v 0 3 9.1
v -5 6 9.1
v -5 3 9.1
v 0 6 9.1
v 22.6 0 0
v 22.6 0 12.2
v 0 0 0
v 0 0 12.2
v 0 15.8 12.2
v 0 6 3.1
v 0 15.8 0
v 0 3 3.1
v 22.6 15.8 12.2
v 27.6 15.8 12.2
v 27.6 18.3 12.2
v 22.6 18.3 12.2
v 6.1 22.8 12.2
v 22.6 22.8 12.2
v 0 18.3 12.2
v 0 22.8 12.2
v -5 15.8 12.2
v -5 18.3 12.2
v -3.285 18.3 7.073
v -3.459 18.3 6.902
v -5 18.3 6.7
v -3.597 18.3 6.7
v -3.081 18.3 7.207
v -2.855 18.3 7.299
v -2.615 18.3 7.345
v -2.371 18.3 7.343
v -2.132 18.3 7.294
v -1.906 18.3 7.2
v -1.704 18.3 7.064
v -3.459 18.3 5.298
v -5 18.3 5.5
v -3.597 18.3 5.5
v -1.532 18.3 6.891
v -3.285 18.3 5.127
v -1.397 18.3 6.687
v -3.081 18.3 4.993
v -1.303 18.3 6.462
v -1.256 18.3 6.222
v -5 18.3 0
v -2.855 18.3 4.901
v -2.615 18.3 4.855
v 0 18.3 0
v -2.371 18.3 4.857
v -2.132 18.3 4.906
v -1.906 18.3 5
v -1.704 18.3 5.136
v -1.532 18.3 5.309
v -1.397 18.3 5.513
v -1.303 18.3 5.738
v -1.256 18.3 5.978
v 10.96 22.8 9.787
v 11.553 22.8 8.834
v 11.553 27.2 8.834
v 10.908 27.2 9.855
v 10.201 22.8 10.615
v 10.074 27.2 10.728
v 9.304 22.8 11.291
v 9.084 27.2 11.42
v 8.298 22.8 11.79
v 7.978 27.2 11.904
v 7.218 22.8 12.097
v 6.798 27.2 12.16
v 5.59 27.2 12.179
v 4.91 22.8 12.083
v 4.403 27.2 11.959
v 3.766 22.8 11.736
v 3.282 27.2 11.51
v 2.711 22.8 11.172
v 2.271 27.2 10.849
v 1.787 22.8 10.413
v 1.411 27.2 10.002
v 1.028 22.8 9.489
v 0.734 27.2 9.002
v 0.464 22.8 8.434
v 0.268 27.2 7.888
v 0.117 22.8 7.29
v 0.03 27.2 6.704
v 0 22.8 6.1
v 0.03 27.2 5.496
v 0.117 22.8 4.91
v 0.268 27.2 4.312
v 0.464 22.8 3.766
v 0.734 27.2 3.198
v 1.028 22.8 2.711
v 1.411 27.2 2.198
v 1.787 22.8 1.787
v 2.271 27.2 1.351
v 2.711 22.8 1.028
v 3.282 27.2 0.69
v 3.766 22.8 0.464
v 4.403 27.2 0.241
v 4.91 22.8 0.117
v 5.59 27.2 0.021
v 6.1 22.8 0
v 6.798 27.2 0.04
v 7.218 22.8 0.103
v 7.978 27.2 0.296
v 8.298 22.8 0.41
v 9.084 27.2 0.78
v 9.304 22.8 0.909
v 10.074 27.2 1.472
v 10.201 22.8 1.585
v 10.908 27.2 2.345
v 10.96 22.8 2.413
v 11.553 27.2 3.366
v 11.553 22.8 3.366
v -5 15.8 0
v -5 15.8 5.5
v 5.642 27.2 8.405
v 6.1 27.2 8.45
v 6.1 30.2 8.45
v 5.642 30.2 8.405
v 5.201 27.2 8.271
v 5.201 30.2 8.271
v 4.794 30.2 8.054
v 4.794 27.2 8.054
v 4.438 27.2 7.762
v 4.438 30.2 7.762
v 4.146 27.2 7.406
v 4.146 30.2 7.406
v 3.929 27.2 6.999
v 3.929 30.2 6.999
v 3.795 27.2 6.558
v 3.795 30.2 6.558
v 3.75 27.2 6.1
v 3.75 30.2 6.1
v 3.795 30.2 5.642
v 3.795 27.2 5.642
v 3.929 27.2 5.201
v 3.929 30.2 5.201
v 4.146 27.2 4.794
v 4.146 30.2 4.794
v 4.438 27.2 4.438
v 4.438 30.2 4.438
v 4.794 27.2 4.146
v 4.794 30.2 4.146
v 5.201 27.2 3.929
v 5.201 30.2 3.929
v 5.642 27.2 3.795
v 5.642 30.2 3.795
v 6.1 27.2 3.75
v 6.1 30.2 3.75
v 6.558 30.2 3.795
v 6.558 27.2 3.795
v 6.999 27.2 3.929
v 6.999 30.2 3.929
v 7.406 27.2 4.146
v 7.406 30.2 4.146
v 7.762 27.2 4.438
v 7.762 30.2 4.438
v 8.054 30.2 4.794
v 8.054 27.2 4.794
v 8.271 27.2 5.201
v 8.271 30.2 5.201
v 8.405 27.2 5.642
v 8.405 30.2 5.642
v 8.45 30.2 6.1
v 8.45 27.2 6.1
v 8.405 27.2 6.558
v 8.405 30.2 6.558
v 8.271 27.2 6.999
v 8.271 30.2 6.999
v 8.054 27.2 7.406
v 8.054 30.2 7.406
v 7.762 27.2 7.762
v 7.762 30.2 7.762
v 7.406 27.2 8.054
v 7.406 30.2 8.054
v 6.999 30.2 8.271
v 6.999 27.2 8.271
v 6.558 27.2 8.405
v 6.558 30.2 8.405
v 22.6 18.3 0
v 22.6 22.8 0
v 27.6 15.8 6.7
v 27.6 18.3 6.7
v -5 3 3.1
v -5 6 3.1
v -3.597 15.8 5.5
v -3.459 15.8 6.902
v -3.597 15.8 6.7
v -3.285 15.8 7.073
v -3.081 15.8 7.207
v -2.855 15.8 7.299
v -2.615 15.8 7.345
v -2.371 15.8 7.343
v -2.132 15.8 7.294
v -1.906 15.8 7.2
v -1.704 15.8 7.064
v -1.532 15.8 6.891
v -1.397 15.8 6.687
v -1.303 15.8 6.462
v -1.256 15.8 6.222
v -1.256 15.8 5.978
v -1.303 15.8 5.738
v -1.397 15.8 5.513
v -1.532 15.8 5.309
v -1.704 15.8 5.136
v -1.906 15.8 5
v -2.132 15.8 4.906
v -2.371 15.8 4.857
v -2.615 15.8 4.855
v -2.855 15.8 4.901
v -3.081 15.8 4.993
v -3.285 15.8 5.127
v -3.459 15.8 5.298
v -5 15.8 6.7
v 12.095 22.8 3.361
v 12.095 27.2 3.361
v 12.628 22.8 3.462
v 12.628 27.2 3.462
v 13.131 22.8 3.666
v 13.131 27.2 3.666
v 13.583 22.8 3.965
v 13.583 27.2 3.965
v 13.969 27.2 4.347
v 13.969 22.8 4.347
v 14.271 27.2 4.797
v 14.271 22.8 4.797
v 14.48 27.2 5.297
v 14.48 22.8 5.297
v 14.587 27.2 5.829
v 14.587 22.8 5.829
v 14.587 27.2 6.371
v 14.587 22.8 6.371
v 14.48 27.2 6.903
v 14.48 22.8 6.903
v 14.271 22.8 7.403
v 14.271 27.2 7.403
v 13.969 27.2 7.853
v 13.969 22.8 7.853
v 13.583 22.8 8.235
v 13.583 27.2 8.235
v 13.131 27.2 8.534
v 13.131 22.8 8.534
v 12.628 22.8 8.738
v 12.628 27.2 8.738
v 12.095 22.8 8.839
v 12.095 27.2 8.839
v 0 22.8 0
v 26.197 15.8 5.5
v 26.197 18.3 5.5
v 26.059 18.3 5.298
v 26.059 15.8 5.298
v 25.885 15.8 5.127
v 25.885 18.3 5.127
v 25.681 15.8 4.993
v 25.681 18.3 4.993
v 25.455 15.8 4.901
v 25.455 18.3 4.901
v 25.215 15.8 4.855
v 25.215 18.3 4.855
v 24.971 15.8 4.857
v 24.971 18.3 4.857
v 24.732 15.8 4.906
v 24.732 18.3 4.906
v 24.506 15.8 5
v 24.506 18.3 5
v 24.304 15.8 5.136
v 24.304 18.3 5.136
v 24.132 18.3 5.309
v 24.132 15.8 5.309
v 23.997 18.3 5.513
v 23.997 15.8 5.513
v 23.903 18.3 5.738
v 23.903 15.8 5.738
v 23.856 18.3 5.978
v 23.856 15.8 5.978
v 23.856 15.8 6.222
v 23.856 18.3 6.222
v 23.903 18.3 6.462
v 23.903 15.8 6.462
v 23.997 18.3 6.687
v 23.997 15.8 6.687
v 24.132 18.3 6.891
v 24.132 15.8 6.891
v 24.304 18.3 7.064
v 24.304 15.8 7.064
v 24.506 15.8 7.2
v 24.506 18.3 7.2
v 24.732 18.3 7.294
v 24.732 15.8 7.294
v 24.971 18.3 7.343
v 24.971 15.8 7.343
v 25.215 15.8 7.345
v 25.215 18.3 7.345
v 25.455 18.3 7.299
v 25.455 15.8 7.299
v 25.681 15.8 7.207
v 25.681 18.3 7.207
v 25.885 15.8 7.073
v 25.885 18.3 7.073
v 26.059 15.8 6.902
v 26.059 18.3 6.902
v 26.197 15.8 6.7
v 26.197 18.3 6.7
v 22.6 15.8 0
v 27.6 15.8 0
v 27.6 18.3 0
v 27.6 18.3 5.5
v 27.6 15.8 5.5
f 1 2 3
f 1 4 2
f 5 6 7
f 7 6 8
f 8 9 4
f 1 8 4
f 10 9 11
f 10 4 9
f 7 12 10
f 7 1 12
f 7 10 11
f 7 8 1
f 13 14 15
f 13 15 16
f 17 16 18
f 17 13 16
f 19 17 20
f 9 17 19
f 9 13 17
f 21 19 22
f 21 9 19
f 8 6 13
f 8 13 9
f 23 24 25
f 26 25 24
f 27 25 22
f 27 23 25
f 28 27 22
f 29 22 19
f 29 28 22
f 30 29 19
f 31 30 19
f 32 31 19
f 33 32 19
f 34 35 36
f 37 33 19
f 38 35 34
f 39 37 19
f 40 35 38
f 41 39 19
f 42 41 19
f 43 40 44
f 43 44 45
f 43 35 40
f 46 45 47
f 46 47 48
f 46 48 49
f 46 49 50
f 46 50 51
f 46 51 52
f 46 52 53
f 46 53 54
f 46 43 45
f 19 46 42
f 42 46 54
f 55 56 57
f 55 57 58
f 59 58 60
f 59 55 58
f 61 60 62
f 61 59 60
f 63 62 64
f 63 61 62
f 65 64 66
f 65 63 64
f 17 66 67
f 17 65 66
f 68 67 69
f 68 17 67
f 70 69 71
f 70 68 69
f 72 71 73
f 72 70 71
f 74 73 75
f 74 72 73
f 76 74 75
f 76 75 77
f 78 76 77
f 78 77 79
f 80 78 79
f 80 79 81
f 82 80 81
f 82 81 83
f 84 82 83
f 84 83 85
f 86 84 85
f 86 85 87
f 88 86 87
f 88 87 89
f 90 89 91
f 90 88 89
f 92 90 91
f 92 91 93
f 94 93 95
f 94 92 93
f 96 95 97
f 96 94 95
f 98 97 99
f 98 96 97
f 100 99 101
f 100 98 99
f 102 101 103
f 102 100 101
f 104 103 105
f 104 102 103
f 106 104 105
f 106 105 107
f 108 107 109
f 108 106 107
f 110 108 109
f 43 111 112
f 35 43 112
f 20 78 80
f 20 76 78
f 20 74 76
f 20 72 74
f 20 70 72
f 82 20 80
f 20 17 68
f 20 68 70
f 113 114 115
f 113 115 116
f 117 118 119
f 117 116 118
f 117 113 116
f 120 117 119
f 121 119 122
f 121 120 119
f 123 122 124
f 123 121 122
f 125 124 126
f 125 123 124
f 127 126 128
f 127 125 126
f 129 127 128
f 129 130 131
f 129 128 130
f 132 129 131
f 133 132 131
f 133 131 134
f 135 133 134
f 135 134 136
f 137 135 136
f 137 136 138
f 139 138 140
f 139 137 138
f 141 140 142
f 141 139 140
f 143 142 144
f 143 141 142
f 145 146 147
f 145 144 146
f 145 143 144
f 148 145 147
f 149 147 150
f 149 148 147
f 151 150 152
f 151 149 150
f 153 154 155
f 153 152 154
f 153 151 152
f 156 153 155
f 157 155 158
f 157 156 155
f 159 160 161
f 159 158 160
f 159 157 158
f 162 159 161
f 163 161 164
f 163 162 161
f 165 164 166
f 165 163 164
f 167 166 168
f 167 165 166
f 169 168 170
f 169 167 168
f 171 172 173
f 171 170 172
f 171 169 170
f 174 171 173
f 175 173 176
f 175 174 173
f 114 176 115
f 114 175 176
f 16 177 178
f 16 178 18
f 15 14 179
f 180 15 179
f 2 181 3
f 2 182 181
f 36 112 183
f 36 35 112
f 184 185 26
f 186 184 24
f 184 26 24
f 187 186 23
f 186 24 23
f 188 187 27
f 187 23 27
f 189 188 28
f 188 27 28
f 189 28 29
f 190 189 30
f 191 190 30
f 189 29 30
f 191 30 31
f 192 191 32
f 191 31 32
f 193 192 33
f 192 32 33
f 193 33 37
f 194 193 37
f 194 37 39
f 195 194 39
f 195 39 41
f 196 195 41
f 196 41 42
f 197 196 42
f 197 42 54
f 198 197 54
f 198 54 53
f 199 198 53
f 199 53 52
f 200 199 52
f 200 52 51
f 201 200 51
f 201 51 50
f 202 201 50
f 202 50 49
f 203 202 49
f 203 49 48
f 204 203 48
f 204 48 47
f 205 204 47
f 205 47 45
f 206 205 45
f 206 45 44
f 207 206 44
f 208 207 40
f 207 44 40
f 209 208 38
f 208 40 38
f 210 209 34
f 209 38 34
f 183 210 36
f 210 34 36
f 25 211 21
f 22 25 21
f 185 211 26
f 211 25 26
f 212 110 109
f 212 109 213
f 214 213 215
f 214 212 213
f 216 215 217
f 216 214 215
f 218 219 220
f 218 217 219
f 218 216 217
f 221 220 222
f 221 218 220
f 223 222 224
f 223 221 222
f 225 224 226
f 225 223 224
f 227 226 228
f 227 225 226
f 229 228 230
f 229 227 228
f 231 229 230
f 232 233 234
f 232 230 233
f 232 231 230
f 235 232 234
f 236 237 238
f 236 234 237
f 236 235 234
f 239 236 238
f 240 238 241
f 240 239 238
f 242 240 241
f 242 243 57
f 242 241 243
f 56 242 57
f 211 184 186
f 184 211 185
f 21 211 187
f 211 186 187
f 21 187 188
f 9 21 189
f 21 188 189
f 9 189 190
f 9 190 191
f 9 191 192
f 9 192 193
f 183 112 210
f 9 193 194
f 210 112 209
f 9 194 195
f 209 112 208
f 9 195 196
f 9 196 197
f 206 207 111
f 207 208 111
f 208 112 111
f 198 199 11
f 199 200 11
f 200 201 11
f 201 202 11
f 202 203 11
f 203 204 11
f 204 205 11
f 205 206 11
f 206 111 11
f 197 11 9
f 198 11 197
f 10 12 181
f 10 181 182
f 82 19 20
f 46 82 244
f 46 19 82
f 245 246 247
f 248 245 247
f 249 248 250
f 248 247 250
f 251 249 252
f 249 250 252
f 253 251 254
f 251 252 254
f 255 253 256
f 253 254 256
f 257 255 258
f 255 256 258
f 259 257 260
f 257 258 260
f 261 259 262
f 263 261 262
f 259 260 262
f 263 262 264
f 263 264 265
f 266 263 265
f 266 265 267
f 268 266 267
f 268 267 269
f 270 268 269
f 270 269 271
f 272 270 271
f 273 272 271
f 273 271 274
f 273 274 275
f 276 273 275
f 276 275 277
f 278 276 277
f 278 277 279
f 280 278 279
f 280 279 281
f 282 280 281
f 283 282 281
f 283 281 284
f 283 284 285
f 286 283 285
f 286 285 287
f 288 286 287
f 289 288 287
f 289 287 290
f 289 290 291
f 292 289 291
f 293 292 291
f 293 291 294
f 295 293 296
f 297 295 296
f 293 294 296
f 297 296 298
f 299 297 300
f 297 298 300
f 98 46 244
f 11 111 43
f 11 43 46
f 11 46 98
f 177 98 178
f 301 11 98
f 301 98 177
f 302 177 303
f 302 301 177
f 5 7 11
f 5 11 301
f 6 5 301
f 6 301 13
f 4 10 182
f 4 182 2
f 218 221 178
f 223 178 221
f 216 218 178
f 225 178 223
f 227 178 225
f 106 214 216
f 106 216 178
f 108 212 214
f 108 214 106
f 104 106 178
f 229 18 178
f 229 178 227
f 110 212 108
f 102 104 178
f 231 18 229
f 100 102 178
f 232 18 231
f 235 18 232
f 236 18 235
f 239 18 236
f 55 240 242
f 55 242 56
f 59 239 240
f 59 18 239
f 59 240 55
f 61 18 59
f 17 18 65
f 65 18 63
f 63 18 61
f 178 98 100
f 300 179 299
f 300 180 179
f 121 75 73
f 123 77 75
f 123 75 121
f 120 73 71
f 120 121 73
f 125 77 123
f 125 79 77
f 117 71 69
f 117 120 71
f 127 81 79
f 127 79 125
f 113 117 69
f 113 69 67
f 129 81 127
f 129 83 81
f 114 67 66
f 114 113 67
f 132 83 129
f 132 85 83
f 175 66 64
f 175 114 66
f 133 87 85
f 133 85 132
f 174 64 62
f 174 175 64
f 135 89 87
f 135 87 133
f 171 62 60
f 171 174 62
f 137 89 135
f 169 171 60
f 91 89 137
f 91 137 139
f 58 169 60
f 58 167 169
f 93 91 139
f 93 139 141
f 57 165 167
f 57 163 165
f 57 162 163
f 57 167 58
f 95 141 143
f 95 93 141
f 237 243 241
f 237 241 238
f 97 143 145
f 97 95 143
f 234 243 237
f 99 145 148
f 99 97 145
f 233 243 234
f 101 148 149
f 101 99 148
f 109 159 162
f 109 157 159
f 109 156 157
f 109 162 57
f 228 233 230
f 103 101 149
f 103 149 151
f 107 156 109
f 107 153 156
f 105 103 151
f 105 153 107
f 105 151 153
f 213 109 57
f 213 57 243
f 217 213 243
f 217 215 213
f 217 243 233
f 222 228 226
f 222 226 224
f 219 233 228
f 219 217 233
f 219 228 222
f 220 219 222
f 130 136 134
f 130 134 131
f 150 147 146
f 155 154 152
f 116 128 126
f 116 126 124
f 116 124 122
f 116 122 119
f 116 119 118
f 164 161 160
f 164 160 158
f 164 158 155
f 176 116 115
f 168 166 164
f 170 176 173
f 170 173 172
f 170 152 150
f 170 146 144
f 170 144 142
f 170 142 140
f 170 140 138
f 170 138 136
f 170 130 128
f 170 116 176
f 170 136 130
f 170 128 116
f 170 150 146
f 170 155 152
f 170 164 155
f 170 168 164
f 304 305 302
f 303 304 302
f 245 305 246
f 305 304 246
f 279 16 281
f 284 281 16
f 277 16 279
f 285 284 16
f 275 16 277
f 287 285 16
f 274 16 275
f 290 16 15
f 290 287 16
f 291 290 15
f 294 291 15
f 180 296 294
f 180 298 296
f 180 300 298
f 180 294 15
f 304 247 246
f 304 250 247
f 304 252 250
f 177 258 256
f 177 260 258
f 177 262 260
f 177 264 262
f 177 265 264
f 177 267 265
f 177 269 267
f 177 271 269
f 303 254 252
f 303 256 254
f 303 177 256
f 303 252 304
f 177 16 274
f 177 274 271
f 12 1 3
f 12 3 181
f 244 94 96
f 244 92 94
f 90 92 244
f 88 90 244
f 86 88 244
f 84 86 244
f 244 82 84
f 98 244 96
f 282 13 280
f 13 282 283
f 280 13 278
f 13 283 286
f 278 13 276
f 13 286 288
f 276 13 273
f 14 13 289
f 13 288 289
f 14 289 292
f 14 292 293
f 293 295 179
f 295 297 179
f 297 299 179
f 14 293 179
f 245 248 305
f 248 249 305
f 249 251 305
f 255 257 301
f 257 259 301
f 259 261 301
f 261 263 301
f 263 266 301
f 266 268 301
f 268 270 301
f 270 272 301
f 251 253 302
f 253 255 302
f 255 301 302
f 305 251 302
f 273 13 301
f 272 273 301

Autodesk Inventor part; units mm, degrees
ref_plane "YZ Plane" through (0, 0, 0) normal (1, 0, 0) x (0, 1, 0)
ref_plane "XZ Plane" through (0, 0, 0) normal (0, 1, 0) x (-1, 0, 0)
sketch "草图1" plane through (0, 0, 0) normal (0, 1, 0) x (-1, 0, 0)
  line L0 (0, 0) -> (-22.6, 0)
  line L1 (-22.6, 0) -> (-22.6, 12.2)
  line L2 (-22.6, 12.2) -> (0, 12.2)
  line L3 (0, 12.2) -> (0, 0)
  dimension "d0" = 22.6
  dimension "d1" = 12.2
extrude "拉伸1" add sketch "草图1" along normal blind 22.8
ref_plane "工作平面1" through (0, 15.8, 0) normal (0, 1, 0) x (1, 0, 0)
sketch "草图2" plane through (0, 15.8, 0) normal (0, 1, 0) x (1, 0, 0)
  line L0 (-5, -12.2) -> (27.6, -12.2)
  line L1 (27.6, -12.2) -> (27.6, 0)
  line L2 (27.6, 0) -> (-5, 0)
  line L3 (-5, 0) -> (-5, -12.2)
  line L4 (0, -12.2) -> (22.6, -12.2) projected
  line L5 (22.6, -12.2) -> (22.6, 0) projected
  line L6 (22.6, 0) -> (0, 0) projected
  line L7 (0, 0) -> (0, -12.2) projected
  line L8 (22.6, 0) -> (0, 0) projected
  line L9 (0, -12.2) -> (22.6, -12.2) projected
  dimension "d5" = 5
  dimension "d6" = 5
extrude "拉伸2" add sketch "草图2" along normal blind 2.5
sketch "草图3" plane through (0, 22.8, 0) normal (0, 1, 0) x (1, 0, 0)
  line L0 (0, -12.2) -> (22.6, -12.2) projected
  line L1 (22.6, -12.2) -> (22.6, 0) projected
  line L2 (22.6, 0) -> (0, 0) projected
  line L3 (0, 0) -> (0, -12.2) projected
  circle A0 centre (6.1, -6.1) radius 6.1
  line L4 (0, 0) -> (0, -12.2) projected
  line L5 (0, -6.1) -> (6.1, -6.1) construction
  circle A1 centre (11.85, -6.1) radius 2.75
  line L6 (14.6, -6.1) -> (0, -6.1) construction
  point P0 (11.553, -3.3661)
  point P1 (11.553, -8.8339)
  dimension "d14" = 5.5
  dimension "d15" = 14.6
extrude "拉伸3" add sketch "草图3" along normal blind 4.4 contours A0 A1 | A1 A0 | A0 A1
sketch "草图4" plane through (6.1, 27.2, 6.1) normal (0, 1, 0) x (0, 0, 1)
  arc A0 (-2.7339, 5.453) -> (2.7339, 5.453) centre (0, 0) ccw projected
  circle A1 centre (0, 0) radius 2.35
  arc A2 (2.7339, 5.453) -> (-2.7339, 5.453) centre (0, 5.75) ccw projected
  point P0 (-6.1, -6.1)
  dimension "d16" = 4.7
extrude "拉伸4" add sketch "草图4" along normal blind 3 contours A1
sketch "草图5" plane through (0, 18.3, 0) normal (0, 1, 0) x (1, 0, 0)
  line L0 (0, 0) -> (0, -12.2) projected
  line L1 (0, 0) -> (-5, 0) projected
  line L2 (-5, 0) -> (-5, -12.2) projected
  line L3 (-5, -12.2) -> (0, -12.2) projected
  line L4 (22.6, -12.2) -> (22.6, 0) projected
  line L5 (22.6, -12.2) -> (27.6, -12.2) projected
  line L6 (27.6, -12.2) -> (27.6, 0) projected
  line L7 (27.6, 0) -> (22.6, 0) projected
  circle A0 centre (-2.5, -6.1) radius 1.25
  circle A1 centre (25.1, -6.1) radius 1.25
  line L8 (-5, 0) -> (-5, -12.2) projected
  line L9 (-5, -6.1) -> (-2.5, -6.1) construction
  line L10 (-5, -6.7) -> (-3.5966, -6.7)
  line L11 (-5, -5.5) -> (-3.5966, -5.5)
  line L12 (27.6, -12.2) -> (27.6, 0) projected
  line L13 (27.6, -6.7) -> (26.1966, -6.7)
  line L14 (27.6, -5.5) -> (26.1966, -5.5)
  point P0 (0, 0)
  dimension "d17" = 2.5
  dimension "d18" = 2.5
  dimension "d19" = 2.5
  dimension "d20" = 2.5
  dimension "d21" = 0.6
  dimension "d22" = 0.6
extrude "拉伸5" cut sketch "草图5" against normal through all contours L11 A0 L10 L2 | A0 | L13 A1 L14 L6 | A1
sketch "草图6" plane through (0, 0, 0) normal (-1, 0, 0) x (0, 0, 1)
  line L0 (3.1, 6) -> (9.1, 6)
  line L1 (9.1, 6) -> (9.1, 3)
  line L2 (9.1, 3) -> (3.1, 3)
  line L3 (3.1, 3) -> (3.1, 6)
  line L4 (12.2, 15.8) -> (0, 15.8) projected
  line L5 (0, 0) -> (0, 15.8) projected
  line L6 (0, 0) -> (12.2, 0) projected
  line L7 (12.2, 0) -> (12.2, 15.8) projected
  line L8 (6.1, 0) -> (6.1, 6) construction
  dimension "d25" = 6
  dimension "d26" = 3
  dimension "d27" = 6
extrude "拉伸6" add sketch "草图6" along normal blind 5 contours L0 L1 L2 L3
ref_plane "工作平面2" through (6.1, 18.3, 12.2) normal (-1, 0, 0) x (0, 0, 1)
properties part number "sg90"
